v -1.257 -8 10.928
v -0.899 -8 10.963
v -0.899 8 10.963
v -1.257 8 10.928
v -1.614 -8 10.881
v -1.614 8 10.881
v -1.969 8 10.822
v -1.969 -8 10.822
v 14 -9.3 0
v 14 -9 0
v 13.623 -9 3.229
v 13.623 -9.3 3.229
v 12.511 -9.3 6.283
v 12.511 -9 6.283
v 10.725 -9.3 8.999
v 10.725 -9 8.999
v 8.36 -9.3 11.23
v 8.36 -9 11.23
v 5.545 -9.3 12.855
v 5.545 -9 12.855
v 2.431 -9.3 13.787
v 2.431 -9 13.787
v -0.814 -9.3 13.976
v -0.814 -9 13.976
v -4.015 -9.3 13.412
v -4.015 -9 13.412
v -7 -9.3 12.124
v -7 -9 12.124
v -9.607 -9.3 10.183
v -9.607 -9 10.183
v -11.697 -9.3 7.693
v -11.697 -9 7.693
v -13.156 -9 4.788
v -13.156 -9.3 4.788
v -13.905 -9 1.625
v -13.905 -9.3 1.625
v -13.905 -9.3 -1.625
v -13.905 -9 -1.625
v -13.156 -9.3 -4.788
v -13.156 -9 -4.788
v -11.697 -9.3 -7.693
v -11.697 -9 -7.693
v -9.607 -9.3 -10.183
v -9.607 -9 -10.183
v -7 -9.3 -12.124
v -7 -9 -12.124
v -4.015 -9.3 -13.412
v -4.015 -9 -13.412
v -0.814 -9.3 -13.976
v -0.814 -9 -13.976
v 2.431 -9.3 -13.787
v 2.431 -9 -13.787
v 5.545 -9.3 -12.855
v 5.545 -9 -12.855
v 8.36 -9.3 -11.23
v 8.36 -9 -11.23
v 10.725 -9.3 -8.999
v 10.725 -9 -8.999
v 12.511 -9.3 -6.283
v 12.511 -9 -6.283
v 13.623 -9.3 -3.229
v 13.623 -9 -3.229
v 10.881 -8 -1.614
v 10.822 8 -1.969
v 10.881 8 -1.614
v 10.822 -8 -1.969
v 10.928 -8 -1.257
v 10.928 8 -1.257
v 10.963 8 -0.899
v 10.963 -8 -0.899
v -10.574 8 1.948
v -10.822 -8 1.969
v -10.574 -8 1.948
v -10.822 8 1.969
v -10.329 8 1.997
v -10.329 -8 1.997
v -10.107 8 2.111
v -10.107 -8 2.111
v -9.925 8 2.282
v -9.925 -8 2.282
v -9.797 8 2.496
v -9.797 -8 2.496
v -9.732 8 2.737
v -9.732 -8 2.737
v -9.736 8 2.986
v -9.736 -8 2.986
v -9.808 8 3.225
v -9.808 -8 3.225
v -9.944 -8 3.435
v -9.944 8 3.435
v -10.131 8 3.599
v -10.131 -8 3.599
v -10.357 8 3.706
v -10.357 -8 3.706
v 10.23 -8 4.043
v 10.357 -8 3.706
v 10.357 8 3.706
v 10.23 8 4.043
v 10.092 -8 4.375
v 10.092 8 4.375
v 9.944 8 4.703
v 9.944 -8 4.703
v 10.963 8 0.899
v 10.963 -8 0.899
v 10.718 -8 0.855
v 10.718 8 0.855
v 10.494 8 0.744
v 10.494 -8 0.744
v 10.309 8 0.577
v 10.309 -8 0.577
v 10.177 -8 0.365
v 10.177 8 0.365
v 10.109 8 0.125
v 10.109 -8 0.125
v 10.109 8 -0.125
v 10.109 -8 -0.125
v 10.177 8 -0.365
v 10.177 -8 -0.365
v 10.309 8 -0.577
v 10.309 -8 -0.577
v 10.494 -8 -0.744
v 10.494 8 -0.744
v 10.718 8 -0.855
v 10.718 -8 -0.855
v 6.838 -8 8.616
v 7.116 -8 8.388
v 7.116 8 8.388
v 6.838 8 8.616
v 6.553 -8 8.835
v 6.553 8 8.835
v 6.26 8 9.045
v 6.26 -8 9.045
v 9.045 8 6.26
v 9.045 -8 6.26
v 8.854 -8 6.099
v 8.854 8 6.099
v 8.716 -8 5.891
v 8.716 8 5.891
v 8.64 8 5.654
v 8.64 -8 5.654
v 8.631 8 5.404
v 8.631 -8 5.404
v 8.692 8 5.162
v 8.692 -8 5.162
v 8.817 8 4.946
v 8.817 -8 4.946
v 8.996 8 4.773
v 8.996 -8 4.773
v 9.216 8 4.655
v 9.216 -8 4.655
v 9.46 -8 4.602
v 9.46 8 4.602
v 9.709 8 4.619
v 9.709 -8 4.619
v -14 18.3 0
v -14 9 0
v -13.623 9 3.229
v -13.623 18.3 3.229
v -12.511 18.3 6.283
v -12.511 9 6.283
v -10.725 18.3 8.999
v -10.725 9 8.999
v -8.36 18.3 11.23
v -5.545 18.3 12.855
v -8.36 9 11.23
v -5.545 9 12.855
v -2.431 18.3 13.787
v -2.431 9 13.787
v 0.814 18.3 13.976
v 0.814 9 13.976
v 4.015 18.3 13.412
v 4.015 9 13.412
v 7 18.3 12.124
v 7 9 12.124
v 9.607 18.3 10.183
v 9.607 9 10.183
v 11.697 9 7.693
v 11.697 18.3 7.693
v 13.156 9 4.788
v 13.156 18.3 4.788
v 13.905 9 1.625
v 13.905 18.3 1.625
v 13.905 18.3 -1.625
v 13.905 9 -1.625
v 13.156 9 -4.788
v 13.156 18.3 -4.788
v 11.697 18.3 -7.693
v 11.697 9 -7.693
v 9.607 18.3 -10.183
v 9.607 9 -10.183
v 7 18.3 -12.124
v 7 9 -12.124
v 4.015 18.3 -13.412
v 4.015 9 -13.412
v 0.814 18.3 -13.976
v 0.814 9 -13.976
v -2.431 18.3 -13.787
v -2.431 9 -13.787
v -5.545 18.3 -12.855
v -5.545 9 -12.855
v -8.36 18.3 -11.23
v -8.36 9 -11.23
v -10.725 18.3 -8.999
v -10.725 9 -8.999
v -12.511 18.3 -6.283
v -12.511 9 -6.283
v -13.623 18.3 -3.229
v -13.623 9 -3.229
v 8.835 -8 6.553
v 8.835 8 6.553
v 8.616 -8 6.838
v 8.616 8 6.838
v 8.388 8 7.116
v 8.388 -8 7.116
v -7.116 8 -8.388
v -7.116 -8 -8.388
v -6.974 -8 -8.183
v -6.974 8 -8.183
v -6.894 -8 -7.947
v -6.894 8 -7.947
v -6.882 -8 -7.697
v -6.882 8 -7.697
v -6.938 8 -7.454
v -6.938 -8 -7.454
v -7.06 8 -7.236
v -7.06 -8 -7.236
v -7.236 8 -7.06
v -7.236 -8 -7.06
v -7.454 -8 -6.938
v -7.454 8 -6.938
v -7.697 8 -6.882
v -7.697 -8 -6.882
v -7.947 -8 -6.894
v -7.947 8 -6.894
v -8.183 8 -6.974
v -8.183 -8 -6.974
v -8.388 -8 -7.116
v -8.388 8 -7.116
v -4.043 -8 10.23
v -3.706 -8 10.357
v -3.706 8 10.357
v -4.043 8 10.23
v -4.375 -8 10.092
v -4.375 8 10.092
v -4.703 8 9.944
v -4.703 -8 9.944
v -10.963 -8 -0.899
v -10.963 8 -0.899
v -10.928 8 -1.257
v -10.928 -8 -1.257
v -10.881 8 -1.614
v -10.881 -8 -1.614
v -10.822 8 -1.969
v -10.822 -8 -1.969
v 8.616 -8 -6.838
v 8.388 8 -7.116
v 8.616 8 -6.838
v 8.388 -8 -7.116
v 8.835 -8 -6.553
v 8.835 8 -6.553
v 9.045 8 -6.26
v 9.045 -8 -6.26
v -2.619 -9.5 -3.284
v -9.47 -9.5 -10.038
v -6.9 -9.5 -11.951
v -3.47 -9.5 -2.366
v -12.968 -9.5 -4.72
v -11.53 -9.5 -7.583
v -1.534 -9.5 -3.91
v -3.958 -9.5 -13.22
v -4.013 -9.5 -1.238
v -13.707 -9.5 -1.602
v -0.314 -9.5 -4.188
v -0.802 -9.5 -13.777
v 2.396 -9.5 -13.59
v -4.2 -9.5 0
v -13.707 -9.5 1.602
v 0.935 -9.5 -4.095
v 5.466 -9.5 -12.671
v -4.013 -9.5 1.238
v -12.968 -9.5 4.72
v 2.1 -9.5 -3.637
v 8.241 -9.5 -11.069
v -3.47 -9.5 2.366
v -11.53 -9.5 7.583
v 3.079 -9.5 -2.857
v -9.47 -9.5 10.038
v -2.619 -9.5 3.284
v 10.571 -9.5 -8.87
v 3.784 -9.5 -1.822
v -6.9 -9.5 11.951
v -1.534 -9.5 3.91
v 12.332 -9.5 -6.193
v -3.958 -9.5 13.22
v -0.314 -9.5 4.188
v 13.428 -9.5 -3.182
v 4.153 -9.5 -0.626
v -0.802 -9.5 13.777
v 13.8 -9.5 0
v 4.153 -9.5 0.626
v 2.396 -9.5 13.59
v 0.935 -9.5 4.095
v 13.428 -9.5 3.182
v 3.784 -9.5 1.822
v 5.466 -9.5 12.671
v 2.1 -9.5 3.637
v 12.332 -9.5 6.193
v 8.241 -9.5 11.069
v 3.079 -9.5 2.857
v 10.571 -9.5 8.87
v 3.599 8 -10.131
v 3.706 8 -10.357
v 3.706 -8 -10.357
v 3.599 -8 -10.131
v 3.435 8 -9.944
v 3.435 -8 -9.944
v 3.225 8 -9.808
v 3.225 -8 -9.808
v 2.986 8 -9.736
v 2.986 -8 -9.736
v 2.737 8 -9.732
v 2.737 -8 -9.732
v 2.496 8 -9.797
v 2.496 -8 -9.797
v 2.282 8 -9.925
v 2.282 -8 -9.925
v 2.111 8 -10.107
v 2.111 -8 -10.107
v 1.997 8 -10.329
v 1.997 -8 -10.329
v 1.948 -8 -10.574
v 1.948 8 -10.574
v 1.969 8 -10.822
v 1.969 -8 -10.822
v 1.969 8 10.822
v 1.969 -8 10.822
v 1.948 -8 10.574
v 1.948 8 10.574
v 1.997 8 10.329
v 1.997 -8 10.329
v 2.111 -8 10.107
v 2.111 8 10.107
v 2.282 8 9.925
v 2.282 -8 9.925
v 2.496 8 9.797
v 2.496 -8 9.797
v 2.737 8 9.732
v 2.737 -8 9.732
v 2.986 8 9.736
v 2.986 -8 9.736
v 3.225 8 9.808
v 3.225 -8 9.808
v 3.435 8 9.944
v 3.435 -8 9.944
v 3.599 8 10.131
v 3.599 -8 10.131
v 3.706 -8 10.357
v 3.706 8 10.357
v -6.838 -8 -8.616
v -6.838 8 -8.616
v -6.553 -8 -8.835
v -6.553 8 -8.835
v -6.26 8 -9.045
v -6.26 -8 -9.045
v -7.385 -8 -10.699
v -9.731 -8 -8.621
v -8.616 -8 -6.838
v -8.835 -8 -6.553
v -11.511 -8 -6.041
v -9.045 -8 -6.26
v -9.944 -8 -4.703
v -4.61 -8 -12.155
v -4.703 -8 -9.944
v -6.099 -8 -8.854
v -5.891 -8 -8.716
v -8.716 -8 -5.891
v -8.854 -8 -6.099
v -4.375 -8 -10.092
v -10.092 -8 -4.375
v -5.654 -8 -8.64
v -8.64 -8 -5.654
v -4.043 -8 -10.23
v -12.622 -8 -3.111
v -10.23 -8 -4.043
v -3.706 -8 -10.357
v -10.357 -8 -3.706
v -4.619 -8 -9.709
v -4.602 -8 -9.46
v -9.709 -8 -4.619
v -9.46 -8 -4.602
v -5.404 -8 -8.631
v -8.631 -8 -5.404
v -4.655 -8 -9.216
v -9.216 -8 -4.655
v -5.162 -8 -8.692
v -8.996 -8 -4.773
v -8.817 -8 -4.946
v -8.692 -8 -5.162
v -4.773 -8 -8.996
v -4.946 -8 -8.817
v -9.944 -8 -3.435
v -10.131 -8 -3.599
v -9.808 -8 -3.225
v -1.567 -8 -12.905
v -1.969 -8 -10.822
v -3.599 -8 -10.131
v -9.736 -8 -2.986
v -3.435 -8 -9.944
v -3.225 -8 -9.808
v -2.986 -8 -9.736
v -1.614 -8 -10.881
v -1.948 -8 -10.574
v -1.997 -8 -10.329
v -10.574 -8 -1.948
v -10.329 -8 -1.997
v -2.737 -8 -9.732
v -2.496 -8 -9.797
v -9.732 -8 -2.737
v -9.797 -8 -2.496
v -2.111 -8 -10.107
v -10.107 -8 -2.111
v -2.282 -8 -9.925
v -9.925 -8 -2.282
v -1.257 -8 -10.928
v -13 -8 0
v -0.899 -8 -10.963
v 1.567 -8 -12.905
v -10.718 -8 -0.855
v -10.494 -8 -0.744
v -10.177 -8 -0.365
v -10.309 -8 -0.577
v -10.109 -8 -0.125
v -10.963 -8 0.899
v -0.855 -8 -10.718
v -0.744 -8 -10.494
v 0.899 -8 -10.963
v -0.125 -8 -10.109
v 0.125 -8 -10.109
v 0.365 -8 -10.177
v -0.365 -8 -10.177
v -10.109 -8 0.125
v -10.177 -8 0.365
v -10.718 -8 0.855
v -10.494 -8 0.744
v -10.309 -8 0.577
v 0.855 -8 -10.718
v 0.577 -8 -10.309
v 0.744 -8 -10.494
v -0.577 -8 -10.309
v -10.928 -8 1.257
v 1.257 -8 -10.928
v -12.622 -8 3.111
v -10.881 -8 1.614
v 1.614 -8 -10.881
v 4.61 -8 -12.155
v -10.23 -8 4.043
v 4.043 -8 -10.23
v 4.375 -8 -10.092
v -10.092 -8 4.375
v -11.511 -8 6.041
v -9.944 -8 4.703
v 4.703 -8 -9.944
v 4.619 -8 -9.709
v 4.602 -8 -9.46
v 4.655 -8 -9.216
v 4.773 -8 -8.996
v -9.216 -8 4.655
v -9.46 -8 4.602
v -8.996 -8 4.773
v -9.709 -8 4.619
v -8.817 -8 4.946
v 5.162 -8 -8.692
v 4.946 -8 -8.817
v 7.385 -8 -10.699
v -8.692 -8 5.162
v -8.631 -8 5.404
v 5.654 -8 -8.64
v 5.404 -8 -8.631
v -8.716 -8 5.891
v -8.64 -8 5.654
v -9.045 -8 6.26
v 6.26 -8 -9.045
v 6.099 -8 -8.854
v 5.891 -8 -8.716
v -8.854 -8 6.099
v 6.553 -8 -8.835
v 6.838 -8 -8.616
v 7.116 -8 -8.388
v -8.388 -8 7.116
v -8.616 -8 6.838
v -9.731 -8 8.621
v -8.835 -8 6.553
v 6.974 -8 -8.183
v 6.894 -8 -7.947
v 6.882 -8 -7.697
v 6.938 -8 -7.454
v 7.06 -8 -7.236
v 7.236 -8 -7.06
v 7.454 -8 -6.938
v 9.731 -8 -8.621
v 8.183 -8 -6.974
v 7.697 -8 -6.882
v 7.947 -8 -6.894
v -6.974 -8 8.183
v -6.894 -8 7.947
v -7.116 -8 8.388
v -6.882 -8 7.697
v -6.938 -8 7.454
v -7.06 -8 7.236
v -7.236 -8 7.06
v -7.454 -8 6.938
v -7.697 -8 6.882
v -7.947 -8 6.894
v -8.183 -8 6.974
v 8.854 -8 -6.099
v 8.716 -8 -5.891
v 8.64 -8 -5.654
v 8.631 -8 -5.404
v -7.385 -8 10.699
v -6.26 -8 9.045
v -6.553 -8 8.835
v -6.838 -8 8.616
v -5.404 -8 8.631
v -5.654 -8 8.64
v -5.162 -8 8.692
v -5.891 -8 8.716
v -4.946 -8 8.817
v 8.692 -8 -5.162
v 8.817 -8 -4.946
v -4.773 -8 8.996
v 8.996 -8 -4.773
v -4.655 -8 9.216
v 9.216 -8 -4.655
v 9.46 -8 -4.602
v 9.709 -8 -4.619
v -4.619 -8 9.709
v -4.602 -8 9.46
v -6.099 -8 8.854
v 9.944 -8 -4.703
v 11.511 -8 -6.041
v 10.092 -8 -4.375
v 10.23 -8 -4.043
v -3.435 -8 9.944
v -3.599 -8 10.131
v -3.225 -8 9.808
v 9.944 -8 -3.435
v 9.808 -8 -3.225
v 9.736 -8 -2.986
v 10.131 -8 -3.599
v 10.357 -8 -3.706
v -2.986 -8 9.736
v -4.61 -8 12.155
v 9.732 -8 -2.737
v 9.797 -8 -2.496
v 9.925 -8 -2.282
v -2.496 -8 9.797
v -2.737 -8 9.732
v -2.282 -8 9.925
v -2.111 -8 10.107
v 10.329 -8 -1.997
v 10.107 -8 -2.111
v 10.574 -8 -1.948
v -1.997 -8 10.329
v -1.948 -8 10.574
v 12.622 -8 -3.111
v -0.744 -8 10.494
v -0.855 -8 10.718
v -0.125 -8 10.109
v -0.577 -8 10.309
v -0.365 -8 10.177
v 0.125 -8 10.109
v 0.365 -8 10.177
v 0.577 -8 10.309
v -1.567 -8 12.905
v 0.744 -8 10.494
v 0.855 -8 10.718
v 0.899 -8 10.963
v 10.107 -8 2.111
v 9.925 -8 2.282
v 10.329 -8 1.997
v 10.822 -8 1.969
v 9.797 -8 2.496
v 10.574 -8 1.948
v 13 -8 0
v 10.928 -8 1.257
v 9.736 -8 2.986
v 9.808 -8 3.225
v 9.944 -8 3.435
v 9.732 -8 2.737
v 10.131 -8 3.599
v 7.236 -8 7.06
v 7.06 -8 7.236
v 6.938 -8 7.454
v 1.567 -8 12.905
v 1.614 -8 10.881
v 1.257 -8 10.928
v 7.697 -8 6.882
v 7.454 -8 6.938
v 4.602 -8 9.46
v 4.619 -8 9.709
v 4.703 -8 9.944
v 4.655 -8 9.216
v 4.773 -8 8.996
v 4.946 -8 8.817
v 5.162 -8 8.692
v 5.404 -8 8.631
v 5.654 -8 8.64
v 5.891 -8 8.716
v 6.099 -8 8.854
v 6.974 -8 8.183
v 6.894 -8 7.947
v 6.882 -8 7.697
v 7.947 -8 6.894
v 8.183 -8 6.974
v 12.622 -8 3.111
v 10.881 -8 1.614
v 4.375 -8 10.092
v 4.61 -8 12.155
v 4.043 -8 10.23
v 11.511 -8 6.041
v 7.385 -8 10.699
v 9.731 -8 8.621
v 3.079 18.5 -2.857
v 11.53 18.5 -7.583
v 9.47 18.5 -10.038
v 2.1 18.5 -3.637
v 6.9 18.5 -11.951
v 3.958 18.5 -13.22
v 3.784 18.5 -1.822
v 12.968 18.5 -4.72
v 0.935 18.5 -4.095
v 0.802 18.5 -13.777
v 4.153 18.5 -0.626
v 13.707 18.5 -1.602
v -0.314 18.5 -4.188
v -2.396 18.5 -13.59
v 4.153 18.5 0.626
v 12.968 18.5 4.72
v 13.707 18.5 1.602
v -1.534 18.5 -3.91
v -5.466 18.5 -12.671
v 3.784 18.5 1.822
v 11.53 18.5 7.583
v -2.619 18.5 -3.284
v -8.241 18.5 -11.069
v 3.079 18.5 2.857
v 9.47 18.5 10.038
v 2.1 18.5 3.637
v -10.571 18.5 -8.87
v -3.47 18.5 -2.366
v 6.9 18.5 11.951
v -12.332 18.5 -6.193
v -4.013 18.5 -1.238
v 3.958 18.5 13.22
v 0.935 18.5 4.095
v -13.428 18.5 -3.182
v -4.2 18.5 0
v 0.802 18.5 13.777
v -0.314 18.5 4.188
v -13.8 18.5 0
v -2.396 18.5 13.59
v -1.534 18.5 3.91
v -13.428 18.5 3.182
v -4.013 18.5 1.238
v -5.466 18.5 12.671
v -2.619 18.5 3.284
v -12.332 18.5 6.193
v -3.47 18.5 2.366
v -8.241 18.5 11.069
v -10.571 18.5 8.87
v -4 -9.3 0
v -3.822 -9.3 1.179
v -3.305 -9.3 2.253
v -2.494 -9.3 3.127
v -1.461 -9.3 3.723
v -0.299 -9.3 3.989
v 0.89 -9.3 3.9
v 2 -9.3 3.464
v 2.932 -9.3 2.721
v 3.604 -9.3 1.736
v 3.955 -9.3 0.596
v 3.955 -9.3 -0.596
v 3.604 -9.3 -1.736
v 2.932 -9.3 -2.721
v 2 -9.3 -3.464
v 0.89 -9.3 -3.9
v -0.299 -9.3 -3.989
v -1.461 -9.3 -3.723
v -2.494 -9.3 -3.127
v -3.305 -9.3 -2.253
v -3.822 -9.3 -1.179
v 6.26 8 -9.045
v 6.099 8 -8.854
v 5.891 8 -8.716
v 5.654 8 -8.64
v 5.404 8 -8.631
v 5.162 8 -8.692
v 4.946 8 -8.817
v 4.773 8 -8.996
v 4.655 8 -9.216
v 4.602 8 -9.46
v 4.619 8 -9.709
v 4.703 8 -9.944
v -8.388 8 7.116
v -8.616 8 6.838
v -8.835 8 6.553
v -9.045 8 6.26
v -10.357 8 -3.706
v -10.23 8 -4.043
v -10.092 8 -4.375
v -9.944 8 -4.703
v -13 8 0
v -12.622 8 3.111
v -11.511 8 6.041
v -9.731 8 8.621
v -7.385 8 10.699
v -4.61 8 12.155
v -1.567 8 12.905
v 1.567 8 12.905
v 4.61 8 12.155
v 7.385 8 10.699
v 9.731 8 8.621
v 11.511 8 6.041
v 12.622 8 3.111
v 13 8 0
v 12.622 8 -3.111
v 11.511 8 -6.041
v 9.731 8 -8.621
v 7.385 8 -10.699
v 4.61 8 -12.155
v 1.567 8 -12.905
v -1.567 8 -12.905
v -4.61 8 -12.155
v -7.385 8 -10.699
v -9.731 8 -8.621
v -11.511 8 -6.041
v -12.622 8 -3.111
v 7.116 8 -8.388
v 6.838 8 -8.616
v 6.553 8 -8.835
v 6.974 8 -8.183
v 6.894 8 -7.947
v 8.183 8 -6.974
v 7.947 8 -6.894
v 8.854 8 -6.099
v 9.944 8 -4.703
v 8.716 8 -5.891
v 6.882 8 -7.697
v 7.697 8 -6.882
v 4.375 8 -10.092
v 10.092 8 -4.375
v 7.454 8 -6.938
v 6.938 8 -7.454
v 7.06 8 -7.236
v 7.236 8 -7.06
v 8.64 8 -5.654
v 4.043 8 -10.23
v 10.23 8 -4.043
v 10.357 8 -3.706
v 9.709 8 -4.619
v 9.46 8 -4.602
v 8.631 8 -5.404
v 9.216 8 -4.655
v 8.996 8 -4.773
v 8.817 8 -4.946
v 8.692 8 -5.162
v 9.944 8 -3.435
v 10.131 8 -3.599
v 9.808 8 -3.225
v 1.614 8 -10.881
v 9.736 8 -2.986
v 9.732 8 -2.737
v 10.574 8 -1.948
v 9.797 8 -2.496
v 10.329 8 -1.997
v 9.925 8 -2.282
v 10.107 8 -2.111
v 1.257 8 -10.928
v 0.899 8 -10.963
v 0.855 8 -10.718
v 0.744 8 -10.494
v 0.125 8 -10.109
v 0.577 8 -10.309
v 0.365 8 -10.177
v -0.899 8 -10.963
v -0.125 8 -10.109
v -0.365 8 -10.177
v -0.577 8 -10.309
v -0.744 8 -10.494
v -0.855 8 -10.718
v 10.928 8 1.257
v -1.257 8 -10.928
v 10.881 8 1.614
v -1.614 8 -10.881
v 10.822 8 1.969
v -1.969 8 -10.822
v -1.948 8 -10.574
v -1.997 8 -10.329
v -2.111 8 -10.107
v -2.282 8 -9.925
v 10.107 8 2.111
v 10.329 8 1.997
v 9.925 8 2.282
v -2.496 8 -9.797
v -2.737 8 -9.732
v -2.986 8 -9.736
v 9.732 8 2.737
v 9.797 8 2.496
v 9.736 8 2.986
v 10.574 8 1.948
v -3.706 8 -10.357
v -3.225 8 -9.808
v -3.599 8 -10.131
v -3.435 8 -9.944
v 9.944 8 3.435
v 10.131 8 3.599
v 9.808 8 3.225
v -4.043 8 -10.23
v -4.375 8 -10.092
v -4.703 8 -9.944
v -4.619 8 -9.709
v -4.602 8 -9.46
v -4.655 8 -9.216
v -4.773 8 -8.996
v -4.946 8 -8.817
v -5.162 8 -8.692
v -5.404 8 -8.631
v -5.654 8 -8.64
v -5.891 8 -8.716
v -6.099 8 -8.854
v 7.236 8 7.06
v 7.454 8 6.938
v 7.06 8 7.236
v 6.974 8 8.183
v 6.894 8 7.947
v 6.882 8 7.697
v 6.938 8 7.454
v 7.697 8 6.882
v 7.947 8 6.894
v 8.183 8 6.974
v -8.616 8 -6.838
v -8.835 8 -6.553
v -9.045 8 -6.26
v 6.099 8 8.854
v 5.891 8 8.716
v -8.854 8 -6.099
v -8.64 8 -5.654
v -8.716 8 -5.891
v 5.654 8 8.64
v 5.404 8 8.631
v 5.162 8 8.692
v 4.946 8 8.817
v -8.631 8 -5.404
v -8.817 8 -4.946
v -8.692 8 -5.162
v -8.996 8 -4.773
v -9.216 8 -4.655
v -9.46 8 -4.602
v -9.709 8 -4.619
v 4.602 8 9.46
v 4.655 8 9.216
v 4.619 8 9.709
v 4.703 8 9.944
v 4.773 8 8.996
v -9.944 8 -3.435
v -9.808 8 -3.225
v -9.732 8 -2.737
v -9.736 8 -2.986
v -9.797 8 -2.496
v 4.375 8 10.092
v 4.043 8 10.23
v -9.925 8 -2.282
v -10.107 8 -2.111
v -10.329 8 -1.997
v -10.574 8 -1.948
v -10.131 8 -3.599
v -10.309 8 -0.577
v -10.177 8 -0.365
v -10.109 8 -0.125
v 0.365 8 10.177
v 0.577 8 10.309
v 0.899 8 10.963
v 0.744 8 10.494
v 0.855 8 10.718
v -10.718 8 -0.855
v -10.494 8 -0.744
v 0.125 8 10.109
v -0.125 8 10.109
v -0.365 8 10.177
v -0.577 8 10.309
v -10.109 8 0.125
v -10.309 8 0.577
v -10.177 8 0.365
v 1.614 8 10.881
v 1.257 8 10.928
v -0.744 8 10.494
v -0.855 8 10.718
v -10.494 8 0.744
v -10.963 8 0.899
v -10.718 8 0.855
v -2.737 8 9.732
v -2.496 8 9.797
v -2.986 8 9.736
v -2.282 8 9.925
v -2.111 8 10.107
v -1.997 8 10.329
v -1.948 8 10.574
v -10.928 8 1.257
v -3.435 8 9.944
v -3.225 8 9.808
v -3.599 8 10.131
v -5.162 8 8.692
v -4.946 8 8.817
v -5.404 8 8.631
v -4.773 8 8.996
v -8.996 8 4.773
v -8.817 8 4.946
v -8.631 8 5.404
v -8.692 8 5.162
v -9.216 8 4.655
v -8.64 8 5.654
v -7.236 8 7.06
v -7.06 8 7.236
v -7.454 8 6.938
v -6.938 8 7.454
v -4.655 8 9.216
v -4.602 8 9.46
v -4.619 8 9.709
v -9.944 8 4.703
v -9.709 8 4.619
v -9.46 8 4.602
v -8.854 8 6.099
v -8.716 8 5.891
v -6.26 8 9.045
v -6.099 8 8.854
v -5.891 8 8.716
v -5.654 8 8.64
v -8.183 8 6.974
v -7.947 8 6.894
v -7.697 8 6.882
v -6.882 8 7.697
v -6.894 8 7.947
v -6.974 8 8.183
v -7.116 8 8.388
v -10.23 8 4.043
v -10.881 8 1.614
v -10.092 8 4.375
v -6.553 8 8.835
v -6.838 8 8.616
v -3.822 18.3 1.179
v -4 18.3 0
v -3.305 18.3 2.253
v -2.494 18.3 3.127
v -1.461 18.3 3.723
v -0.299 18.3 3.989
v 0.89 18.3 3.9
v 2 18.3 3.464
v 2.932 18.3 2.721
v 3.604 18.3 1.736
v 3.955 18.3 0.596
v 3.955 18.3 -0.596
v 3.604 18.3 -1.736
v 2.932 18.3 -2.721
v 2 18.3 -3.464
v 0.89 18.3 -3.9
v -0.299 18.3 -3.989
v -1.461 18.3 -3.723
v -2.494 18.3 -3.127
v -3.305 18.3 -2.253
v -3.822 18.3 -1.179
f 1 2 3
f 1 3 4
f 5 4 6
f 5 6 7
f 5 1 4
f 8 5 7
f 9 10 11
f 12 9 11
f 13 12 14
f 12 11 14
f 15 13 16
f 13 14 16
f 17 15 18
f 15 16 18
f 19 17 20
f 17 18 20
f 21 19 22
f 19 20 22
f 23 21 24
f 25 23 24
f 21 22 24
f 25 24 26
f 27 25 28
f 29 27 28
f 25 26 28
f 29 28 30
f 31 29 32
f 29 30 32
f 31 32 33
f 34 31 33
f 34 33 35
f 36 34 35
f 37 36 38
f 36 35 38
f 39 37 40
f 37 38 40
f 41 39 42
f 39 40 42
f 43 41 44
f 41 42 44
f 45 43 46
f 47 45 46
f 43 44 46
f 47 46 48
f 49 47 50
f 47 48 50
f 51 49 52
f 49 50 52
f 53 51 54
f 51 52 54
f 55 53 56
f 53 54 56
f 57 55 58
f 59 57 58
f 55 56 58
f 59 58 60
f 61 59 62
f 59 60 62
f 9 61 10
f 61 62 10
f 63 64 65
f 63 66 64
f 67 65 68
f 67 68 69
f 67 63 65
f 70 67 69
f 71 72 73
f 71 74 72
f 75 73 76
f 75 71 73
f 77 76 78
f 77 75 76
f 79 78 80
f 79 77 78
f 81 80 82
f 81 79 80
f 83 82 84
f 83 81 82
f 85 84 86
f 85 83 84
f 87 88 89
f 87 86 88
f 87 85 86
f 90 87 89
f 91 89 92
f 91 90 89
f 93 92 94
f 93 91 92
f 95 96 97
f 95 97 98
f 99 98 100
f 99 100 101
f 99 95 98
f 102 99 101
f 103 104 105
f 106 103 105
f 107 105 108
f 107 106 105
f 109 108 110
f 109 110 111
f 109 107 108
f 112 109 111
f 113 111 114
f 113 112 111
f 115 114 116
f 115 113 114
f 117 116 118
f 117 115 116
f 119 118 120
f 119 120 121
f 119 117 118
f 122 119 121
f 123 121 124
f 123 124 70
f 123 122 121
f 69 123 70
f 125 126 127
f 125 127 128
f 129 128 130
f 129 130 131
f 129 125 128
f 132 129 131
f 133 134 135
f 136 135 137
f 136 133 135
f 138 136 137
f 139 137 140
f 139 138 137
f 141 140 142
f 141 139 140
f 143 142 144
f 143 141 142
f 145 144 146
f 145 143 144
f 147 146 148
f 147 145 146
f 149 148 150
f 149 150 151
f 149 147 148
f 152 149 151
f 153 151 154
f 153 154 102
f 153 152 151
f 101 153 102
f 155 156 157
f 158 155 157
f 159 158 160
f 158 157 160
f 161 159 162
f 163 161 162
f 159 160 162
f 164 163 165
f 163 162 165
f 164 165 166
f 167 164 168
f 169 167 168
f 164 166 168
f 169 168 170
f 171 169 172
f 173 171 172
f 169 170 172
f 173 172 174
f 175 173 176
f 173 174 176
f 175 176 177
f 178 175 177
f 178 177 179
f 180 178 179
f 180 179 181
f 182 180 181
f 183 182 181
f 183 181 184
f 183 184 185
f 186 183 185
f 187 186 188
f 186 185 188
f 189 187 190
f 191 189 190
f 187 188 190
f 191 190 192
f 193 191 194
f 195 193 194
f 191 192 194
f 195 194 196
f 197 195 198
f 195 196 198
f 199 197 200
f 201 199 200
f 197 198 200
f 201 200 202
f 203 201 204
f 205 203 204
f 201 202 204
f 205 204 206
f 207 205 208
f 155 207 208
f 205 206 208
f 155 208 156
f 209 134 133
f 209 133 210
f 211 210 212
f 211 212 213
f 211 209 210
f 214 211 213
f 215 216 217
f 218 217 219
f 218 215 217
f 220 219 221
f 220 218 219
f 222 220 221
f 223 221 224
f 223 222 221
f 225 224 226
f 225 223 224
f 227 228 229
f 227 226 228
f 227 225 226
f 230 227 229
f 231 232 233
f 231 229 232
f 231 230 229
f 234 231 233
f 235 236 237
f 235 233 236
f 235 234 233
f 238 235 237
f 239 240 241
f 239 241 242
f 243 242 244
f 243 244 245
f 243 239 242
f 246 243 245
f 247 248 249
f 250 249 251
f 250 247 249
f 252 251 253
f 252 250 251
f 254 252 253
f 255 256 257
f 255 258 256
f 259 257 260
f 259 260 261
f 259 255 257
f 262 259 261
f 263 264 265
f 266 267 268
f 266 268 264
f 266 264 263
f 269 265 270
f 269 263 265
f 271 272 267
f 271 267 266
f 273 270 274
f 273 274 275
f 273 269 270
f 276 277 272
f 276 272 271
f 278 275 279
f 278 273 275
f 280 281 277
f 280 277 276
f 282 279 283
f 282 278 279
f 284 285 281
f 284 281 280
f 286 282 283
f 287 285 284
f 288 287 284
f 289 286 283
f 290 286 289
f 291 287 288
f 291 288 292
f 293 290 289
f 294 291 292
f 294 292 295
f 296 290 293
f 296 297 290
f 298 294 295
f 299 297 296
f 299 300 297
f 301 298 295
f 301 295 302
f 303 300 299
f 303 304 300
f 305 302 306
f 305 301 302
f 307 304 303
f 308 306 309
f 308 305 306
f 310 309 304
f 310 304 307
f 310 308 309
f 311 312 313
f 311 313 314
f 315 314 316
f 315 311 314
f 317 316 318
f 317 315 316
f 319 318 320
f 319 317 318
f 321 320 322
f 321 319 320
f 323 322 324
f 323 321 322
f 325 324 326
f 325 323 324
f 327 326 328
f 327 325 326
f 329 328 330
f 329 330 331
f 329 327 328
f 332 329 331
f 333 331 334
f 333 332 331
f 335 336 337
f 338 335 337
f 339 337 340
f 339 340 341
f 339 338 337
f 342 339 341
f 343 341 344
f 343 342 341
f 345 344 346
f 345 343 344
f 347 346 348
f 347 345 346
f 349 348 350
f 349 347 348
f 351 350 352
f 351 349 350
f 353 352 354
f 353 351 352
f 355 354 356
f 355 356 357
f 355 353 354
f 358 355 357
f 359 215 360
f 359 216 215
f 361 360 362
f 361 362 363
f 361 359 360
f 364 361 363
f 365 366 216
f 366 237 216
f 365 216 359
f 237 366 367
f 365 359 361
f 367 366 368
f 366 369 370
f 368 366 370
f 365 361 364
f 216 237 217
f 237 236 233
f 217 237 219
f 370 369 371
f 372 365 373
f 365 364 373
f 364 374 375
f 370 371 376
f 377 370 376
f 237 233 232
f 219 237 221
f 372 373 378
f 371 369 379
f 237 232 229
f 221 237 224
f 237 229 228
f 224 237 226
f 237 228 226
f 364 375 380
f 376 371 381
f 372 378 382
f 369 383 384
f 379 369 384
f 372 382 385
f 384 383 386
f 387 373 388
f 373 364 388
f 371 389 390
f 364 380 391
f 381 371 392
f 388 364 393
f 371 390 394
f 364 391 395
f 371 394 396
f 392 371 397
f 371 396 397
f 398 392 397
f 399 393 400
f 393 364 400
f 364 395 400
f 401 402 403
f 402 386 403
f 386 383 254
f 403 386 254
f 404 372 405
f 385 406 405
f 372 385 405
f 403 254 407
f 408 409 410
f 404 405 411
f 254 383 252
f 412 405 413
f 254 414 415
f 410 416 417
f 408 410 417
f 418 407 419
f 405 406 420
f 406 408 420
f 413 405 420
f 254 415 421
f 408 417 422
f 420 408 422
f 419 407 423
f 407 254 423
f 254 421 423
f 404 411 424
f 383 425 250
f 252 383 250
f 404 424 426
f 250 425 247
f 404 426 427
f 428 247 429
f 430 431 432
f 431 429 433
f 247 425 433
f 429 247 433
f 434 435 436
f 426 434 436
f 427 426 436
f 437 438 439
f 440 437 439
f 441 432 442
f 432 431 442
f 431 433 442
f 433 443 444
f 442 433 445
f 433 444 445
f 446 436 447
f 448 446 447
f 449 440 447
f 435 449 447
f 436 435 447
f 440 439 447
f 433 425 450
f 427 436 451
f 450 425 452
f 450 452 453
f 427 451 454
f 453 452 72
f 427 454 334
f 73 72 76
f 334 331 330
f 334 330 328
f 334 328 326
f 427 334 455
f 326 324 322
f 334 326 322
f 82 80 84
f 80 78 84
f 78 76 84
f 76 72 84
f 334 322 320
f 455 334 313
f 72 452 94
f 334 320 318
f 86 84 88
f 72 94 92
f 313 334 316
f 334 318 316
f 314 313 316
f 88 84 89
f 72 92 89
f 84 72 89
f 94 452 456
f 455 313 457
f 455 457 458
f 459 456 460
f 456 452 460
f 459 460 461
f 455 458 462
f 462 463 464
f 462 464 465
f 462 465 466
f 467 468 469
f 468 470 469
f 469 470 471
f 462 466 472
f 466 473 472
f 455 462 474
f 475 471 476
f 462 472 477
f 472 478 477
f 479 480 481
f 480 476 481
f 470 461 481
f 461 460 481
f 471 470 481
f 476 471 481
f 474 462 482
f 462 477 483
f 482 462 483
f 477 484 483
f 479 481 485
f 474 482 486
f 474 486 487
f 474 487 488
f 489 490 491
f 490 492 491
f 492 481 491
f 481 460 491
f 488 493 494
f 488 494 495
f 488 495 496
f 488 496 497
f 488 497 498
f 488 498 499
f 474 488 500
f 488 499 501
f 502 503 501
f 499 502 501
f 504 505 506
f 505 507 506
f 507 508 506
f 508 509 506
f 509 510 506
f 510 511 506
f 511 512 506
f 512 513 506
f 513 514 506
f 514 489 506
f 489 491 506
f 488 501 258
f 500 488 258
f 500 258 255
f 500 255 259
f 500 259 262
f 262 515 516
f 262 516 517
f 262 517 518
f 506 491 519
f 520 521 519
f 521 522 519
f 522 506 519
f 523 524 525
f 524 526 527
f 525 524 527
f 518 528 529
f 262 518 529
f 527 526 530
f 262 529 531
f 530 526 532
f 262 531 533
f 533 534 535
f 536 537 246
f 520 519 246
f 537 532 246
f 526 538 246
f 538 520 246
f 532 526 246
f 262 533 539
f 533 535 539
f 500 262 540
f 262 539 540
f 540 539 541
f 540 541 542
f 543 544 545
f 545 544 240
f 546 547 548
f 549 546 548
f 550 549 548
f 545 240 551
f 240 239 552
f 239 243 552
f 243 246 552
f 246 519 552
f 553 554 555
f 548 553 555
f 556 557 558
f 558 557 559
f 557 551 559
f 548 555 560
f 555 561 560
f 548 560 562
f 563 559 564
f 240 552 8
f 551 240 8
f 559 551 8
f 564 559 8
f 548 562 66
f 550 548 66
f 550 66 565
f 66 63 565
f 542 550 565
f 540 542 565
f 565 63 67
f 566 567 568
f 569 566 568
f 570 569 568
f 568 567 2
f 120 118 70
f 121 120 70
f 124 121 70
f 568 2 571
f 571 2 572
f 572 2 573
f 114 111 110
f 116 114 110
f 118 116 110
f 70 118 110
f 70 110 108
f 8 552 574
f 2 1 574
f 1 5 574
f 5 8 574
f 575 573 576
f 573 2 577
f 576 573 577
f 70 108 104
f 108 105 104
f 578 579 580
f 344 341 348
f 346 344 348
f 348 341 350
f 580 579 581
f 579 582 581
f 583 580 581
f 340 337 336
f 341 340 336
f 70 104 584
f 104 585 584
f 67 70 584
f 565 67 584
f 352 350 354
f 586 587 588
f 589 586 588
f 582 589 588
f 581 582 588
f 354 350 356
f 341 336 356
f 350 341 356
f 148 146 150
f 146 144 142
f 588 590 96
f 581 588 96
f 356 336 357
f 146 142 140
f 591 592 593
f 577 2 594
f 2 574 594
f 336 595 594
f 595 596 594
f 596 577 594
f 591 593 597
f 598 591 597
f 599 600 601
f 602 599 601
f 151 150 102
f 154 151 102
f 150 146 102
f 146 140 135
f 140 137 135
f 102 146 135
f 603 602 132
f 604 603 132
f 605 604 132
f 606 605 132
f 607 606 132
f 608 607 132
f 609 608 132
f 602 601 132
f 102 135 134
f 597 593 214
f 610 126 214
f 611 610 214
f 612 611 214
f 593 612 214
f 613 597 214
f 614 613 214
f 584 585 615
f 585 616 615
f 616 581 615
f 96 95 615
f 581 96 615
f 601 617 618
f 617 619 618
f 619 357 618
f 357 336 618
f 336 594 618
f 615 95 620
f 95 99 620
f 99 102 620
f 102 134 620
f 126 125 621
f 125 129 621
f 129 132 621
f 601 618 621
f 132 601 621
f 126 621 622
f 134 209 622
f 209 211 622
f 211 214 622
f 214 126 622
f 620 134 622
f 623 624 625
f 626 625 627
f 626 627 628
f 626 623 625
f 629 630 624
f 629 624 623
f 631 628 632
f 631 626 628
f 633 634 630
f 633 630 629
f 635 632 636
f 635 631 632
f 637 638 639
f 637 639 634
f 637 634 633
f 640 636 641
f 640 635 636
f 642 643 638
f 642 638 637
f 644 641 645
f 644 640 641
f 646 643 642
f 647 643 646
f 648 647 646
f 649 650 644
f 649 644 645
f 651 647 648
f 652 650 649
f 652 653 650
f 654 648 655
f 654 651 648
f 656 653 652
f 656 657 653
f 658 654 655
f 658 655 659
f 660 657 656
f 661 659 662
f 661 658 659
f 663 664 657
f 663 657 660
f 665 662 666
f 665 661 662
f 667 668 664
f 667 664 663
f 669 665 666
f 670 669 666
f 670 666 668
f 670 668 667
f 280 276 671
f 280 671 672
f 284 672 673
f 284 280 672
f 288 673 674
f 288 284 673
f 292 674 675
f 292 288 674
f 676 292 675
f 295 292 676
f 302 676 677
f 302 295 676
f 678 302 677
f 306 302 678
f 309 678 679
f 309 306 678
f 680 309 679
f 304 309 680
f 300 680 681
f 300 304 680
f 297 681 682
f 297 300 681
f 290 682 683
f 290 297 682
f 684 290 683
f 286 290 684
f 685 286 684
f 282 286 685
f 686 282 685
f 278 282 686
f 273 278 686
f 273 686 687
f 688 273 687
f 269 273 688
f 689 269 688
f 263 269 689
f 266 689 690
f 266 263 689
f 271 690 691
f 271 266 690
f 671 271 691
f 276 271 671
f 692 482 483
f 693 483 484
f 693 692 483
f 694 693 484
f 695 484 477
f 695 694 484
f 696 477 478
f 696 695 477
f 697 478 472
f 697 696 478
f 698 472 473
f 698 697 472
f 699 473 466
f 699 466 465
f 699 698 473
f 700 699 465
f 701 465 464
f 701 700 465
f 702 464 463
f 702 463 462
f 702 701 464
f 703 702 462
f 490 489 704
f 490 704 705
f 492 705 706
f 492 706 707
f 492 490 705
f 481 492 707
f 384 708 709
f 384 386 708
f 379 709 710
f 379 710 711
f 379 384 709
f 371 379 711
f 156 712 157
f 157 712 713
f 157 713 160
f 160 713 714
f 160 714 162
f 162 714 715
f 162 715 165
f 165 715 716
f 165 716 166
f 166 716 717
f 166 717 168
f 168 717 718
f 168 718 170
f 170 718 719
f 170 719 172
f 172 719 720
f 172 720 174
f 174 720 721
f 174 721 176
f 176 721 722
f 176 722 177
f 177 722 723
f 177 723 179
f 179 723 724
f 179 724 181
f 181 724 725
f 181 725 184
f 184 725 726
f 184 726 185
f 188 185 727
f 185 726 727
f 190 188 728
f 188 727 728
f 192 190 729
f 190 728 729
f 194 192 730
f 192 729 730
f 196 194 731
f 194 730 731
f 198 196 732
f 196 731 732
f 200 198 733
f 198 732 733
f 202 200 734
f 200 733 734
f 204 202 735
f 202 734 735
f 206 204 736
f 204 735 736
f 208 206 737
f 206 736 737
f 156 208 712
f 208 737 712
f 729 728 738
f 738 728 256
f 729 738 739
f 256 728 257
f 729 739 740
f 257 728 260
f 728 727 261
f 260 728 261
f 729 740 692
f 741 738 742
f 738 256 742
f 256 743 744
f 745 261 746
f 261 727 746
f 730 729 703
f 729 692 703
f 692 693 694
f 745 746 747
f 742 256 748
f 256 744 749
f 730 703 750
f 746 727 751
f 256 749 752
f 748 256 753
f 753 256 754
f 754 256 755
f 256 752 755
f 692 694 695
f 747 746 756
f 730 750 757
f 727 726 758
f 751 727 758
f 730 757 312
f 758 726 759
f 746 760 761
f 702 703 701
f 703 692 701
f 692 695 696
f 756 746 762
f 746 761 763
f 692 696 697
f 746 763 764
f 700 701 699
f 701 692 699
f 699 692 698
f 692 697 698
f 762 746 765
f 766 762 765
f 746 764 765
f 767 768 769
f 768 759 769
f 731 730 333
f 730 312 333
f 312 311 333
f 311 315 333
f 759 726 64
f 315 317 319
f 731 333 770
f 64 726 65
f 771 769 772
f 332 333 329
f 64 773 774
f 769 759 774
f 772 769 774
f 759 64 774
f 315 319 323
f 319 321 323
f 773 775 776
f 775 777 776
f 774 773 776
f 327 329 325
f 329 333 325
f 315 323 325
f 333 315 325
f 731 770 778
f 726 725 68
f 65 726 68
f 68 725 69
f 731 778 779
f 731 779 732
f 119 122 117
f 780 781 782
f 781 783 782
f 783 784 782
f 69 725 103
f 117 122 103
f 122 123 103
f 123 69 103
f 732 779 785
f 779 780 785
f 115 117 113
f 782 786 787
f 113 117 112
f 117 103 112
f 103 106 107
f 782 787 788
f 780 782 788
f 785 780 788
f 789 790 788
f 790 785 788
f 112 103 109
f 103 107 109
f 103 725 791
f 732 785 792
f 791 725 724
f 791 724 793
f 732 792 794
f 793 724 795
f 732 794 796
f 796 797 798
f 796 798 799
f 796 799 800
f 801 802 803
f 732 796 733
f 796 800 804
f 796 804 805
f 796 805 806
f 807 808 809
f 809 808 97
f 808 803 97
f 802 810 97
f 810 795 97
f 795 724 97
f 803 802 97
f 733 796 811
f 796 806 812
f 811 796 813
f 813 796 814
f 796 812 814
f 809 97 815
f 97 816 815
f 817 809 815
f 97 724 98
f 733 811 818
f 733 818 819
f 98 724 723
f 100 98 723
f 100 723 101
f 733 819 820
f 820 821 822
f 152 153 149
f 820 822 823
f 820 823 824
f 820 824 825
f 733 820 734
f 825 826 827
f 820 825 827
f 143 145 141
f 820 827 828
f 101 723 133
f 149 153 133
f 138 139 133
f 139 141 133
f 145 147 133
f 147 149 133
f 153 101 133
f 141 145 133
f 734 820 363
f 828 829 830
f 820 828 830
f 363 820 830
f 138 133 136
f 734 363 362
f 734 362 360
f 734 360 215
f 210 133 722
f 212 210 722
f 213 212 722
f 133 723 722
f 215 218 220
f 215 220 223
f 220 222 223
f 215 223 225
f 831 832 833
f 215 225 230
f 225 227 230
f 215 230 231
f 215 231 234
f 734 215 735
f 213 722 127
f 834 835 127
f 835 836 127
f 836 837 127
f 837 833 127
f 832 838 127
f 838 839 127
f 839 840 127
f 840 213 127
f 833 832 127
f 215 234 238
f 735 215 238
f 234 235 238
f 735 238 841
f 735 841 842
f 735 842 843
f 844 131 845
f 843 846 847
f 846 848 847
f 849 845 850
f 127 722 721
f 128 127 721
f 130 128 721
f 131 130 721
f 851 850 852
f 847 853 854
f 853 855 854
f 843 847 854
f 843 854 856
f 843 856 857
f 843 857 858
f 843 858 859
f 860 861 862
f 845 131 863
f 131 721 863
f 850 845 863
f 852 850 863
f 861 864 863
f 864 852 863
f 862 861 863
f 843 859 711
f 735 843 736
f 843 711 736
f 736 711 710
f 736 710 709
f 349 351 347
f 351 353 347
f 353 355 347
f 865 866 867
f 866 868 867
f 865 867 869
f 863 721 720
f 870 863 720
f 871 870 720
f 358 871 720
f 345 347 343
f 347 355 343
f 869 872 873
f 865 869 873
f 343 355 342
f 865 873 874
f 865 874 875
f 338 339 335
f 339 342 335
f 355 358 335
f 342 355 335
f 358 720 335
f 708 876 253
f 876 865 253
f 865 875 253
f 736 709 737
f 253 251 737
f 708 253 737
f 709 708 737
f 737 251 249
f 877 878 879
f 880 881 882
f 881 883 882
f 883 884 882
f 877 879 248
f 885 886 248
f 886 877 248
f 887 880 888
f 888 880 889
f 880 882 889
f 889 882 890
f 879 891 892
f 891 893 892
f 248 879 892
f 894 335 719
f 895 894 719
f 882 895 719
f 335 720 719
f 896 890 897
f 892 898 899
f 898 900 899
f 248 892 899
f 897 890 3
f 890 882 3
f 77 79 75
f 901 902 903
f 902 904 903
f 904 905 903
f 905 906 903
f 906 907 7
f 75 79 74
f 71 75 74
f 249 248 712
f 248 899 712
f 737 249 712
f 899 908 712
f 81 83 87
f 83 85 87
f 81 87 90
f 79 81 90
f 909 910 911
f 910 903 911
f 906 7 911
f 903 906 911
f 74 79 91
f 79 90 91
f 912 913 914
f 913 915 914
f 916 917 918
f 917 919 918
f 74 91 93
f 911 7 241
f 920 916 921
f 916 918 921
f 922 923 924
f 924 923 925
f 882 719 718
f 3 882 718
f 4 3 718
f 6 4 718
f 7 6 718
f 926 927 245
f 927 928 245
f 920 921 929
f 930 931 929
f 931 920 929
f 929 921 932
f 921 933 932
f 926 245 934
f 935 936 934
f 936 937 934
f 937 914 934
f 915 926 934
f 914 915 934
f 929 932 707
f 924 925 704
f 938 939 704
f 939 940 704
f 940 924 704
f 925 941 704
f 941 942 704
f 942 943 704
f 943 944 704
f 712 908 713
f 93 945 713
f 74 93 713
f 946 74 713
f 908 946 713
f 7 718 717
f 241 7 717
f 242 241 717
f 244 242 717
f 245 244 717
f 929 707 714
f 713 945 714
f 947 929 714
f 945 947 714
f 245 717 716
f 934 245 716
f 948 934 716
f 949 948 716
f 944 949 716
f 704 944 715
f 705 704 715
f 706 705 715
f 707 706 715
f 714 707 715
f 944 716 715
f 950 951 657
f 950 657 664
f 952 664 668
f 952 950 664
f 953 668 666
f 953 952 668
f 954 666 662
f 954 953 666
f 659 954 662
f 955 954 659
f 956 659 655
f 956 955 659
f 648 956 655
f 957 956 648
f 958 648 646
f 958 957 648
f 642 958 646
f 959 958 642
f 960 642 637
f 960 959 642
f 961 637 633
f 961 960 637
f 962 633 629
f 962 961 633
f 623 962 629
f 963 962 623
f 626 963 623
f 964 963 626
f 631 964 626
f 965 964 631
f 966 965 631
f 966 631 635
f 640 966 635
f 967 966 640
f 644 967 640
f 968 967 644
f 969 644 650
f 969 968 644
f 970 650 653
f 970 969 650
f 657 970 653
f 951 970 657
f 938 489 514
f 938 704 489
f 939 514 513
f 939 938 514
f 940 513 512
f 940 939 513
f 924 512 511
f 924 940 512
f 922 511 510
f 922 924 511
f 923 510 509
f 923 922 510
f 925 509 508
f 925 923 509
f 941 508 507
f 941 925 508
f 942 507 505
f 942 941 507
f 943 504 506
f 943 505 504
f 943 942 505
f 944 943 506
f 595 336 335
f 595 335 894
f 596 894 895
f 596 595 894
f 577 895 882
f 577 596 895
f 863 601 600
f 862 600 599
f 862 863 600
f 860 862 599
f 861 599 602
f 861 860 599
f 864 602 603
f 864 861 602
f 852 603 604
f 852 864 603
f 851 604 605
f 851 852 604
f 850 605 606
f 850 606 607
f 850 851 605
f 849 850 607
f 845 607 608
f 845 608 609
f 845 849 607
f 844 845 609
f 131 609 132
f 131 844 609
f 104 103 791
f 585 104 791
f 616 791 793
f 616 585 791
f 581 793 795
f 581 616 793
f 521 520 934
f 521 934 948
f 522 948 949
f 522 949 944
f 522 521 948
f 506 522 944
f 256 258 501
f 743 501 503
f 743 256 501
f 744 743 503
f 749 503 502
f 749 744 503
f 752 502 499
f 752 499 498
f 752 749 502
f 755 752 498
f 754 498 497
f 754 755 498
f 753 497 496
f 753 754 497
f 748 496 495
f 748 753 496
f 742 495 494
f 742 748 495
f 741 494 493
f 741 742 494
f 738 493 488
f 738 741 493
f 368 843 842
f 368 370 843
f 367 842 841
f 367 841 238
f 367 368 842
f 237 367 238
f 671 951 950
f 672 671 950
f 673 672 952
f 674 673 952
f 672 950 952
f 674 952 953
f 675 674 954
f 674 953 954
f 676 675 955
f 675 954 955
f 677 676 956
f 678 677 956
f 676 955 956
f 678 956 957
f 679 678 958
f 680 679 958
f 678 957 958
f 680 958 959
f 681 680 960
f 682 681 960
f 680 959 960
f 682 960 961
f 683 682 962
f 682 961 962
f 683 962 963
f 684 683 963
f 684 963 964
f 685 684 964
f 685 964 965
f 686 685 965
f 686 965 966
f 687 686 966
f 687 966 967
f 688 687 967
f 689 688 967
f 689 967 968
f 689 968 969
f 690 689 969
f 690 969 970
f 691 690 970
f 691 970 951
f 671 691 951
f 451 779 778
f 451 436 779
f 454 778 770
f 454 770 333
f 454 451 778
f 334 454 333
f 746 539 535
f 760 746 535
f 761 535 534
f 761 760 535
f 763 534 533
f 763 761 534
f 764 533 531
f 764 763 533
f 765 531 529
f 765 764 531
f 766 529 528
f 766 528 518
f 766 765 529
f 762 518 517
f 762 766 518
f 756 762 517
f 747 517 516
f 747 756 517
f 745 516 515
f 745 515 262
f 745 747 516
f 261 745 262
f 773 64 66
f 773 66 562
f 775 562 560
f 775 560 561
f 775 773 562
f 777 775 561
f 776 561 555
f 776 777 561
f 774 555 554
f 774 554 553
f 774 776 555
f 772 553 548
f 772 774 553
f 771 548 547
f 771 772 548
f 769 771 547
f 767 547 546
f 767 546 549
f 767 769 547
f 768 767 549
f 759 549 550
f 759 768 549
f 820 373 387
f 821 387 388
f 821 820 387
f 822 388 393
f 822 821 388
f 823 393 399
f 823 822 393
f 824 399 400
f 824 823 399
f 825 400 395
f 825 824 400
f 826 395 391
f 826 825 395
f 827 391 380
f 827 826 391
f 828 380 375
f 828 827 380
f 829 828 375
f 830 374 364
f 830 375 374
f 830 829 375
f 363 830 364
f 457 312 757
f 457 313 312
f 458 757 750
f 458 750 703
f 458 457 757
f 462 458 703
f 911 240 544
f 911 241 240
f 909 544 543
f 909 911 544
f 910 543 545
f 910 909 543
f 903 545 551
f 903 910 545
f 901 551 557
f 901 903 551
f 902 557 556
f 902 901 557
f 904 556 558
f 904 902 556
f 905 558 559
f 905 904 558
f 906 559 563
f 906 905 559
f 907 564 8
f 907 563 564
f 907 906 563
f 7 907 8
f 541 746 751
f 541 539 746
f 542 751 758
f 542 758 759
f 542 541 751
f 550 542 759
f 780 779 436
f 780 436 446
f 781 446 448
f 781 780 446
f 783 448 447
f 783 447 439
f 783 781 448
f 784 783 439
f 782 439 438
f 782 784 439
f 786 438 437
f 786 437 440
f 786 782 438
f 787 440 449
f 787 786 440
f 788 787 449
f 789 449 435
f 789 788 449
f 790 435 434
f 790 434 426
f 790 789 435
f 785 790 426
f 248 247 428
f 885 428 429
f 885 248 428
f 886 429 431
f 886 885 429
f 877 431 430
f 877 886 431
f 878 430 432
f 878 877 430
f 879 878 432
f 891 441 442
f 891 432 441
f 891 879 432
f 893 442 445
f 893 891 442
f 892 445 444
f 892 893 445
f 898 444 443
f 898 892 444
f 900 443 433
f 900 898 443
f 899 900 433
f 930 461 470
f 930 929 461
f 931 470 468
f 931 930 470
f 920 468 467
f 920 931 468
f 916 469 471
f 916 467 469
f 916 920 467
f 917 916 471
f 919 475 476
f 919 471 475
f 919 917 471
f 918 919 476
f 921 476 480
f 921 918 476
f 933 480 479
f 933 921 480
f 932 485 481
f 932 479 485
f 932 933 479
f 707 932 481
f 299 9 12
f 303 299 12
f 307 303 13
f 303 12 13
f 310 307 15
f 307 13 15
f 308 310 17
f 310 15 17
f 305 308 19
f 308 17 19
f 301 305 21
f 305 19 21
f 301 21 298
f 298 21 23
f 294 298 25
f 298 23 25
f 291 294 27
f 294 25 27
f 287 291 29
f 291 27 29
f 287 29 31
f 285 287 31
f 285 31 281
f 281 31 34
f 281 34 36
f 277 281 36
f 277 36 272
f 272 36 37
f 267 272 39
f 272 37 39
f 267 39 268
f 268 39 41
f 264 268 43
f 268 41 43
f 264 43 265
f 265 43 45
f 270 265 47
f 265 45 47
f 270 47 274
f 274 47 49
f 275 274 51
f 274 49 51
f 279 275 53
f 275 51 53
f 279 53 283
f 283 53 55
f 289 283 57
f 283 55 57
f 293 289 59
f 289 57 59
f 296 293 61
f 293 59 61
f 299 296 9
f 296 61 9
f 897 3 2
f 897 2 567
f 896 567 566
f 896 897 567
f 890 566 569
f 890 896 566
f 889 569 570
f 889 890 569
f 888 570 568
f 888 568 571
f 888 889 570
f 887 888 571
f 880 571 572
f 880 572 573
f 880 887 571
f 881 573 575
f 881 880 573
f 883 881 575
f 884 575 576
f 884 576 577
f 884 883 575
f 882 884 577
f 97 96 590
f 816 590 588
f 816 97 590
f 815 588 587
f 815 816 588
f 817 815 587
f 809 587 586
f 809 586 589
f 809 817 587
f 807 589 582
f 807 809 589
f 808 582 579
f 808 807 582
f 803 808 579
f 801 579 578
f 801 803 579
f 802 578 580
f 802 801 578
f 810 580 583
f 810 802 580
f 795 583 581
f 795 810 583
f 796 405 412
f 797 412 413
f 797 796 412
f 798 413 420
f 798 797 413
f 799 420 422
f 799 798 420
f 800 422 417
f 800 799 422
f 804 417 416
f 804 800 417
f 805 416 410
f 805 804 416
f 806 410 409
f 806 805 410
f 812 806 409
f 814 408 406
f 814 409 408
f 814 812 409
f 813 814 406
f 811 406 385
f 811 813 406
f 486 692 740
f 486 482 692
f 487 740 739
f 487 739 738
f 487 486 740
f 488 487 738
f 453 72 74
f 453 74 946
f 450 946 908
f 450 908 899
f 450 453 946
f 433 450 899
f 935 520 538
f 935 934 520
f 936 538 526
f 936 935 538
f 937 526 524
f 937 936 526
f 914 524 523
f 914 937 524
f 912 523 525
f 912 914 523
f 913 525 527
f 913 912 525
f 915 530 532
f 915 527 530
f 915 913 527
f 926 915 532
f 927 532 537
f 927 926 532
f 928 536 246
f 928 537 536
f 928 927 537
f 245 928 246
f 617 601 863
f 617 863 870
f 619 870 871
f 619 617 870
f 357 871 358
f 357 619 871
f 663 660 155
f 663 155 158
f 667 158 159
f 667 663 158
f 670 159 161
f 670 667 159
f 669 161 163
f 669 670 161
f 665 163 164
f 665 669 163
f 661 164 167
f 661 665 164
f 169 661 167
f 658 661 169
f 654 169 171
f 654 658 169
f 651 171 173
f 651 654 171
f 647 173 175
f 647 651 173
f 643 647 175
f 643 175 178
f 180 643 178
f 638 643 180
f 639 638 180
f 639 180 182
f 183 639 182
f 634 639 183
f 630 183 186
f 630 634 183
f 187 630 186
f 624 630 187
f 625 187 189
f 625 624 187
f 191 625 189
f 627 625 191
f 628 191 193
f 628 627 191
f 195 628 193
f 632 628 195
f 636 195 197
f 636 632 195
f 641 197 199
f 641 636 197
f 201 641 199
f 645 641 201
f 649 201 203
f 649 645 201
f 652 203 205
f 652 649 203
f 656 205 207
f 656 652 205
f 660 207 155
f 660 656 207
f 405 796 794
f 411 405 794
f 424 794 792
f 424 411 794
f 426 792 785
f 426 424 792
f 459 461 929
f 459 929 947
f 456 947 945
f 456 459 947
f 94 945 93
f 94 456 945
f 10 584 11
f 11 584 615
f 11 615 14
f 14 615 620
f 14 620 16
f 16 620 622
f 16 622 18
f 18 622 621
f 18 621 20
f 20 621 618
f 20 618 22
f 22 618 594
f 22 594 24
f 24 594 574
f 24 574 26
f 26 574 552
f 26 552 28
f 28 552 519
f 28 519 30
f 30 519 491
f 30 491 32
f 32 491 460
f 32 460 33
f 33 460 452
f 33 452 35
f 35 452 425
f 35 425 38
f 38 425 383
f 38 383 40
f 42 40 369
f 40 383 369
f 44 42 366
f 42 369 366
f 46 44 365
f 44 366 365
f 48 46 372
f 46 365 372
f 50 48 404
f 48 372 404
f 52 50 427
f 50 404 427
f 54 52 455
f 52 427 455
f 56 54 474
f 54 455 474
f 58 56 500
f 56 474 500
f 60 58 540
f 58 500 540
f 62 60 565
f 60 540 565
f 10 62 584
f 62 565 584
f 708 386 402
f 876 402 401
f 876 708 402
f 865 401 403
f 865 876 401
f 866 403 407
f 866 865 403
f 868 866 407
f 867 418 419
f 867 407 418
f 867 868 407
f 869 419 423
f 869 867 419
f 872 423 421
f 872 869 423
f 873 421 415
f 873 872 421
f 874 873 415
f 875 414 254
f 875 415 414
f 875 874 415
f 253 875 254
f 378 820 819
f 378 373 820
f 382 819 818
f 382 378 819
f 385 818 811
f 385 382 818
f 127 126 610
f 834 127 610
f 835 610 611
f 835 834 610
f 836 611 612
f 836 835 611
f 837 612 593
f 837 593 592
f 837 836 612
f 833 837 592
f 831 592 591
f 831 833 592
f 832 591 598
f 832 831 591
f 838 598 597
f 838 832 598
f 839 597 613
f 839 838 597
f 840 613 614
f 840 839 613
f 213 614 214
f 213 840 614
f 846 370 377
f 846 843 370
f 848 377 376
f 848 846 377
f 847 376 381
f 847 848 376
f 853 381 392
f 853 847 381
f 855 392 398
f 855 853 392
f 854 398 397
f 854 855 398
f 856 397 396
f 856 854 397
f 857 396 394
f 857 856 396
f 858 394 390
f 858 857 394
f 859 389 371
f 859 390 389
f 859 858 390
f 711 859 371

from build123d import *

# Parameters (mm, degrees)
F0_R     = 11
F1_DEPTH = 8
F2_R     = 14
F3_DEPTH = 1.5
F4_R     = 14
F5_DEPTH = 10.5
F6_R     = 4
F7_DEPTH = 28.001
F8_R     = 0.9
F9_DEPTH = 16
F10_SIZE = 1
F11_SIZE = 0.2


with BuildPart() as f1:
    # F0 (on Front) → F1 (new body, symmetric)
    with BuildSketch(Plane.XZ):
        Circle(F0_R)
    extrude(amount=F1_DEPTH, both=True)

    # F2 (on face) → F3 (join)
    with BuildSketch(Plane.XZ.offset(8)):
        Circle(F2_R)
    extrude(amount=F3_DEPTH)

    # F4 (on face) → F5 (join)
    with BuildSketch(Plane(origin=(0, 8, 0), x_dir=(-1, 0, 0), z_dir=(0, 1, 0))):
        Circle(F4_R)
    extrude(amount=F5_DEPTH)

    # F6 (on face) → F7 (cut, through all)
    with BuildSketch(Plane(origin=(0, 18.5, 0), x_dir=(-1, 0, 0), z_dir=(0, 1, 0))):
        Circle(F6_R)
    extrude(amount=-F7_DEPTH, mode=Mode.SUBTRACT)

    # F8 (on face) → F9 (cut, through all)
    with BuildSketch(Plane.XZ.offset(-8)):
        with Locations((0, 11)):
            Circle(F8_R)
        with Locations((-2.8470094961, 10.6251840892)):
            Circle(F8_R)
        with Locations((-5.5, 9.5262794416)):
            Circle(F8_R)
        with Locations((-7.7781745931, 7.7781745931)):
            Circle(F8_R)
        with Locations((-9.5262794416, 5.5)):
            Circle(F8_R)
        with Locations((-10.6251840892, 2.8470094961)):
            Circle(F8_R)
        with Locations((-11, 0)):
            Circle(F8_R)
        with Locations((-10.6251840892, -2.8470094961)):
            Circle(F8_R)
        with Locations((-9.5262794416, -5.5)):
            Circle(F8_R)
        with Locations((-7.7781745931, -7.7781745931)):
            Circle(F8_R)
        with Locations((-5.5, -9.5262794416)):
            Circle(F8_R)
        with Locations((-2.8470094961, -10.6251840892)):
            Circle(F8_R)
        with Locations((0, -11)):
            Circle(F8_R)
        with Locations((2.8470094961, -10.6251840892)):
            Circle(F8_R)
        with Locations((5.5, -9.5262794416)):
            Circle(F8_R)
        with Locations((7.7781745931, -7.7781745931)):
            Circle(F8_R)
        with Locations((9.5262794416, -5.5)):
            Circle(F8_R)
        with Locations((10.6251840892, -2.8470094961)):
            Circle(F8_R)
        with Locations((11, 0)):
            Circle(F8_R)
        with Locations((10.6251840892, 2.8470094961)):
            Circle(F8_R)
        with Locations((9.5262794416, 5.5)):
            Circle(F8_R)
        with Locations((7.7781745931, 7.7781745931)):
            Circle(F8_R)
        with Locations((5.5, 9.5262794416)):
            Circle(F8_R)
        with Locations((2.8470094961, 10.6251840892)):
            Circle(F8_R)
    extrude(amount=F9_DEPTH, mode=Mode.SUBTRACT)

    # F10
    f10_edges = [f1.edges().sort_by_distance(p)[0] for p in [
        (-14, -8, 0),
        (14, 8, 0),
    ]]
    chamfer(f10_edges, length=F10_SIZE)

    # F11
    f11_edges = [f1.edges().sort_by_distance(p)[0] for p in [
        (-14, -9.5, 0),
        (4, -9.5, 0),
        (14, 18.5, 0),
        (4, 18.5, 0),
    ]]
    chamfer(f11_edges, length=F11_SIZE)


solid = f1.part
